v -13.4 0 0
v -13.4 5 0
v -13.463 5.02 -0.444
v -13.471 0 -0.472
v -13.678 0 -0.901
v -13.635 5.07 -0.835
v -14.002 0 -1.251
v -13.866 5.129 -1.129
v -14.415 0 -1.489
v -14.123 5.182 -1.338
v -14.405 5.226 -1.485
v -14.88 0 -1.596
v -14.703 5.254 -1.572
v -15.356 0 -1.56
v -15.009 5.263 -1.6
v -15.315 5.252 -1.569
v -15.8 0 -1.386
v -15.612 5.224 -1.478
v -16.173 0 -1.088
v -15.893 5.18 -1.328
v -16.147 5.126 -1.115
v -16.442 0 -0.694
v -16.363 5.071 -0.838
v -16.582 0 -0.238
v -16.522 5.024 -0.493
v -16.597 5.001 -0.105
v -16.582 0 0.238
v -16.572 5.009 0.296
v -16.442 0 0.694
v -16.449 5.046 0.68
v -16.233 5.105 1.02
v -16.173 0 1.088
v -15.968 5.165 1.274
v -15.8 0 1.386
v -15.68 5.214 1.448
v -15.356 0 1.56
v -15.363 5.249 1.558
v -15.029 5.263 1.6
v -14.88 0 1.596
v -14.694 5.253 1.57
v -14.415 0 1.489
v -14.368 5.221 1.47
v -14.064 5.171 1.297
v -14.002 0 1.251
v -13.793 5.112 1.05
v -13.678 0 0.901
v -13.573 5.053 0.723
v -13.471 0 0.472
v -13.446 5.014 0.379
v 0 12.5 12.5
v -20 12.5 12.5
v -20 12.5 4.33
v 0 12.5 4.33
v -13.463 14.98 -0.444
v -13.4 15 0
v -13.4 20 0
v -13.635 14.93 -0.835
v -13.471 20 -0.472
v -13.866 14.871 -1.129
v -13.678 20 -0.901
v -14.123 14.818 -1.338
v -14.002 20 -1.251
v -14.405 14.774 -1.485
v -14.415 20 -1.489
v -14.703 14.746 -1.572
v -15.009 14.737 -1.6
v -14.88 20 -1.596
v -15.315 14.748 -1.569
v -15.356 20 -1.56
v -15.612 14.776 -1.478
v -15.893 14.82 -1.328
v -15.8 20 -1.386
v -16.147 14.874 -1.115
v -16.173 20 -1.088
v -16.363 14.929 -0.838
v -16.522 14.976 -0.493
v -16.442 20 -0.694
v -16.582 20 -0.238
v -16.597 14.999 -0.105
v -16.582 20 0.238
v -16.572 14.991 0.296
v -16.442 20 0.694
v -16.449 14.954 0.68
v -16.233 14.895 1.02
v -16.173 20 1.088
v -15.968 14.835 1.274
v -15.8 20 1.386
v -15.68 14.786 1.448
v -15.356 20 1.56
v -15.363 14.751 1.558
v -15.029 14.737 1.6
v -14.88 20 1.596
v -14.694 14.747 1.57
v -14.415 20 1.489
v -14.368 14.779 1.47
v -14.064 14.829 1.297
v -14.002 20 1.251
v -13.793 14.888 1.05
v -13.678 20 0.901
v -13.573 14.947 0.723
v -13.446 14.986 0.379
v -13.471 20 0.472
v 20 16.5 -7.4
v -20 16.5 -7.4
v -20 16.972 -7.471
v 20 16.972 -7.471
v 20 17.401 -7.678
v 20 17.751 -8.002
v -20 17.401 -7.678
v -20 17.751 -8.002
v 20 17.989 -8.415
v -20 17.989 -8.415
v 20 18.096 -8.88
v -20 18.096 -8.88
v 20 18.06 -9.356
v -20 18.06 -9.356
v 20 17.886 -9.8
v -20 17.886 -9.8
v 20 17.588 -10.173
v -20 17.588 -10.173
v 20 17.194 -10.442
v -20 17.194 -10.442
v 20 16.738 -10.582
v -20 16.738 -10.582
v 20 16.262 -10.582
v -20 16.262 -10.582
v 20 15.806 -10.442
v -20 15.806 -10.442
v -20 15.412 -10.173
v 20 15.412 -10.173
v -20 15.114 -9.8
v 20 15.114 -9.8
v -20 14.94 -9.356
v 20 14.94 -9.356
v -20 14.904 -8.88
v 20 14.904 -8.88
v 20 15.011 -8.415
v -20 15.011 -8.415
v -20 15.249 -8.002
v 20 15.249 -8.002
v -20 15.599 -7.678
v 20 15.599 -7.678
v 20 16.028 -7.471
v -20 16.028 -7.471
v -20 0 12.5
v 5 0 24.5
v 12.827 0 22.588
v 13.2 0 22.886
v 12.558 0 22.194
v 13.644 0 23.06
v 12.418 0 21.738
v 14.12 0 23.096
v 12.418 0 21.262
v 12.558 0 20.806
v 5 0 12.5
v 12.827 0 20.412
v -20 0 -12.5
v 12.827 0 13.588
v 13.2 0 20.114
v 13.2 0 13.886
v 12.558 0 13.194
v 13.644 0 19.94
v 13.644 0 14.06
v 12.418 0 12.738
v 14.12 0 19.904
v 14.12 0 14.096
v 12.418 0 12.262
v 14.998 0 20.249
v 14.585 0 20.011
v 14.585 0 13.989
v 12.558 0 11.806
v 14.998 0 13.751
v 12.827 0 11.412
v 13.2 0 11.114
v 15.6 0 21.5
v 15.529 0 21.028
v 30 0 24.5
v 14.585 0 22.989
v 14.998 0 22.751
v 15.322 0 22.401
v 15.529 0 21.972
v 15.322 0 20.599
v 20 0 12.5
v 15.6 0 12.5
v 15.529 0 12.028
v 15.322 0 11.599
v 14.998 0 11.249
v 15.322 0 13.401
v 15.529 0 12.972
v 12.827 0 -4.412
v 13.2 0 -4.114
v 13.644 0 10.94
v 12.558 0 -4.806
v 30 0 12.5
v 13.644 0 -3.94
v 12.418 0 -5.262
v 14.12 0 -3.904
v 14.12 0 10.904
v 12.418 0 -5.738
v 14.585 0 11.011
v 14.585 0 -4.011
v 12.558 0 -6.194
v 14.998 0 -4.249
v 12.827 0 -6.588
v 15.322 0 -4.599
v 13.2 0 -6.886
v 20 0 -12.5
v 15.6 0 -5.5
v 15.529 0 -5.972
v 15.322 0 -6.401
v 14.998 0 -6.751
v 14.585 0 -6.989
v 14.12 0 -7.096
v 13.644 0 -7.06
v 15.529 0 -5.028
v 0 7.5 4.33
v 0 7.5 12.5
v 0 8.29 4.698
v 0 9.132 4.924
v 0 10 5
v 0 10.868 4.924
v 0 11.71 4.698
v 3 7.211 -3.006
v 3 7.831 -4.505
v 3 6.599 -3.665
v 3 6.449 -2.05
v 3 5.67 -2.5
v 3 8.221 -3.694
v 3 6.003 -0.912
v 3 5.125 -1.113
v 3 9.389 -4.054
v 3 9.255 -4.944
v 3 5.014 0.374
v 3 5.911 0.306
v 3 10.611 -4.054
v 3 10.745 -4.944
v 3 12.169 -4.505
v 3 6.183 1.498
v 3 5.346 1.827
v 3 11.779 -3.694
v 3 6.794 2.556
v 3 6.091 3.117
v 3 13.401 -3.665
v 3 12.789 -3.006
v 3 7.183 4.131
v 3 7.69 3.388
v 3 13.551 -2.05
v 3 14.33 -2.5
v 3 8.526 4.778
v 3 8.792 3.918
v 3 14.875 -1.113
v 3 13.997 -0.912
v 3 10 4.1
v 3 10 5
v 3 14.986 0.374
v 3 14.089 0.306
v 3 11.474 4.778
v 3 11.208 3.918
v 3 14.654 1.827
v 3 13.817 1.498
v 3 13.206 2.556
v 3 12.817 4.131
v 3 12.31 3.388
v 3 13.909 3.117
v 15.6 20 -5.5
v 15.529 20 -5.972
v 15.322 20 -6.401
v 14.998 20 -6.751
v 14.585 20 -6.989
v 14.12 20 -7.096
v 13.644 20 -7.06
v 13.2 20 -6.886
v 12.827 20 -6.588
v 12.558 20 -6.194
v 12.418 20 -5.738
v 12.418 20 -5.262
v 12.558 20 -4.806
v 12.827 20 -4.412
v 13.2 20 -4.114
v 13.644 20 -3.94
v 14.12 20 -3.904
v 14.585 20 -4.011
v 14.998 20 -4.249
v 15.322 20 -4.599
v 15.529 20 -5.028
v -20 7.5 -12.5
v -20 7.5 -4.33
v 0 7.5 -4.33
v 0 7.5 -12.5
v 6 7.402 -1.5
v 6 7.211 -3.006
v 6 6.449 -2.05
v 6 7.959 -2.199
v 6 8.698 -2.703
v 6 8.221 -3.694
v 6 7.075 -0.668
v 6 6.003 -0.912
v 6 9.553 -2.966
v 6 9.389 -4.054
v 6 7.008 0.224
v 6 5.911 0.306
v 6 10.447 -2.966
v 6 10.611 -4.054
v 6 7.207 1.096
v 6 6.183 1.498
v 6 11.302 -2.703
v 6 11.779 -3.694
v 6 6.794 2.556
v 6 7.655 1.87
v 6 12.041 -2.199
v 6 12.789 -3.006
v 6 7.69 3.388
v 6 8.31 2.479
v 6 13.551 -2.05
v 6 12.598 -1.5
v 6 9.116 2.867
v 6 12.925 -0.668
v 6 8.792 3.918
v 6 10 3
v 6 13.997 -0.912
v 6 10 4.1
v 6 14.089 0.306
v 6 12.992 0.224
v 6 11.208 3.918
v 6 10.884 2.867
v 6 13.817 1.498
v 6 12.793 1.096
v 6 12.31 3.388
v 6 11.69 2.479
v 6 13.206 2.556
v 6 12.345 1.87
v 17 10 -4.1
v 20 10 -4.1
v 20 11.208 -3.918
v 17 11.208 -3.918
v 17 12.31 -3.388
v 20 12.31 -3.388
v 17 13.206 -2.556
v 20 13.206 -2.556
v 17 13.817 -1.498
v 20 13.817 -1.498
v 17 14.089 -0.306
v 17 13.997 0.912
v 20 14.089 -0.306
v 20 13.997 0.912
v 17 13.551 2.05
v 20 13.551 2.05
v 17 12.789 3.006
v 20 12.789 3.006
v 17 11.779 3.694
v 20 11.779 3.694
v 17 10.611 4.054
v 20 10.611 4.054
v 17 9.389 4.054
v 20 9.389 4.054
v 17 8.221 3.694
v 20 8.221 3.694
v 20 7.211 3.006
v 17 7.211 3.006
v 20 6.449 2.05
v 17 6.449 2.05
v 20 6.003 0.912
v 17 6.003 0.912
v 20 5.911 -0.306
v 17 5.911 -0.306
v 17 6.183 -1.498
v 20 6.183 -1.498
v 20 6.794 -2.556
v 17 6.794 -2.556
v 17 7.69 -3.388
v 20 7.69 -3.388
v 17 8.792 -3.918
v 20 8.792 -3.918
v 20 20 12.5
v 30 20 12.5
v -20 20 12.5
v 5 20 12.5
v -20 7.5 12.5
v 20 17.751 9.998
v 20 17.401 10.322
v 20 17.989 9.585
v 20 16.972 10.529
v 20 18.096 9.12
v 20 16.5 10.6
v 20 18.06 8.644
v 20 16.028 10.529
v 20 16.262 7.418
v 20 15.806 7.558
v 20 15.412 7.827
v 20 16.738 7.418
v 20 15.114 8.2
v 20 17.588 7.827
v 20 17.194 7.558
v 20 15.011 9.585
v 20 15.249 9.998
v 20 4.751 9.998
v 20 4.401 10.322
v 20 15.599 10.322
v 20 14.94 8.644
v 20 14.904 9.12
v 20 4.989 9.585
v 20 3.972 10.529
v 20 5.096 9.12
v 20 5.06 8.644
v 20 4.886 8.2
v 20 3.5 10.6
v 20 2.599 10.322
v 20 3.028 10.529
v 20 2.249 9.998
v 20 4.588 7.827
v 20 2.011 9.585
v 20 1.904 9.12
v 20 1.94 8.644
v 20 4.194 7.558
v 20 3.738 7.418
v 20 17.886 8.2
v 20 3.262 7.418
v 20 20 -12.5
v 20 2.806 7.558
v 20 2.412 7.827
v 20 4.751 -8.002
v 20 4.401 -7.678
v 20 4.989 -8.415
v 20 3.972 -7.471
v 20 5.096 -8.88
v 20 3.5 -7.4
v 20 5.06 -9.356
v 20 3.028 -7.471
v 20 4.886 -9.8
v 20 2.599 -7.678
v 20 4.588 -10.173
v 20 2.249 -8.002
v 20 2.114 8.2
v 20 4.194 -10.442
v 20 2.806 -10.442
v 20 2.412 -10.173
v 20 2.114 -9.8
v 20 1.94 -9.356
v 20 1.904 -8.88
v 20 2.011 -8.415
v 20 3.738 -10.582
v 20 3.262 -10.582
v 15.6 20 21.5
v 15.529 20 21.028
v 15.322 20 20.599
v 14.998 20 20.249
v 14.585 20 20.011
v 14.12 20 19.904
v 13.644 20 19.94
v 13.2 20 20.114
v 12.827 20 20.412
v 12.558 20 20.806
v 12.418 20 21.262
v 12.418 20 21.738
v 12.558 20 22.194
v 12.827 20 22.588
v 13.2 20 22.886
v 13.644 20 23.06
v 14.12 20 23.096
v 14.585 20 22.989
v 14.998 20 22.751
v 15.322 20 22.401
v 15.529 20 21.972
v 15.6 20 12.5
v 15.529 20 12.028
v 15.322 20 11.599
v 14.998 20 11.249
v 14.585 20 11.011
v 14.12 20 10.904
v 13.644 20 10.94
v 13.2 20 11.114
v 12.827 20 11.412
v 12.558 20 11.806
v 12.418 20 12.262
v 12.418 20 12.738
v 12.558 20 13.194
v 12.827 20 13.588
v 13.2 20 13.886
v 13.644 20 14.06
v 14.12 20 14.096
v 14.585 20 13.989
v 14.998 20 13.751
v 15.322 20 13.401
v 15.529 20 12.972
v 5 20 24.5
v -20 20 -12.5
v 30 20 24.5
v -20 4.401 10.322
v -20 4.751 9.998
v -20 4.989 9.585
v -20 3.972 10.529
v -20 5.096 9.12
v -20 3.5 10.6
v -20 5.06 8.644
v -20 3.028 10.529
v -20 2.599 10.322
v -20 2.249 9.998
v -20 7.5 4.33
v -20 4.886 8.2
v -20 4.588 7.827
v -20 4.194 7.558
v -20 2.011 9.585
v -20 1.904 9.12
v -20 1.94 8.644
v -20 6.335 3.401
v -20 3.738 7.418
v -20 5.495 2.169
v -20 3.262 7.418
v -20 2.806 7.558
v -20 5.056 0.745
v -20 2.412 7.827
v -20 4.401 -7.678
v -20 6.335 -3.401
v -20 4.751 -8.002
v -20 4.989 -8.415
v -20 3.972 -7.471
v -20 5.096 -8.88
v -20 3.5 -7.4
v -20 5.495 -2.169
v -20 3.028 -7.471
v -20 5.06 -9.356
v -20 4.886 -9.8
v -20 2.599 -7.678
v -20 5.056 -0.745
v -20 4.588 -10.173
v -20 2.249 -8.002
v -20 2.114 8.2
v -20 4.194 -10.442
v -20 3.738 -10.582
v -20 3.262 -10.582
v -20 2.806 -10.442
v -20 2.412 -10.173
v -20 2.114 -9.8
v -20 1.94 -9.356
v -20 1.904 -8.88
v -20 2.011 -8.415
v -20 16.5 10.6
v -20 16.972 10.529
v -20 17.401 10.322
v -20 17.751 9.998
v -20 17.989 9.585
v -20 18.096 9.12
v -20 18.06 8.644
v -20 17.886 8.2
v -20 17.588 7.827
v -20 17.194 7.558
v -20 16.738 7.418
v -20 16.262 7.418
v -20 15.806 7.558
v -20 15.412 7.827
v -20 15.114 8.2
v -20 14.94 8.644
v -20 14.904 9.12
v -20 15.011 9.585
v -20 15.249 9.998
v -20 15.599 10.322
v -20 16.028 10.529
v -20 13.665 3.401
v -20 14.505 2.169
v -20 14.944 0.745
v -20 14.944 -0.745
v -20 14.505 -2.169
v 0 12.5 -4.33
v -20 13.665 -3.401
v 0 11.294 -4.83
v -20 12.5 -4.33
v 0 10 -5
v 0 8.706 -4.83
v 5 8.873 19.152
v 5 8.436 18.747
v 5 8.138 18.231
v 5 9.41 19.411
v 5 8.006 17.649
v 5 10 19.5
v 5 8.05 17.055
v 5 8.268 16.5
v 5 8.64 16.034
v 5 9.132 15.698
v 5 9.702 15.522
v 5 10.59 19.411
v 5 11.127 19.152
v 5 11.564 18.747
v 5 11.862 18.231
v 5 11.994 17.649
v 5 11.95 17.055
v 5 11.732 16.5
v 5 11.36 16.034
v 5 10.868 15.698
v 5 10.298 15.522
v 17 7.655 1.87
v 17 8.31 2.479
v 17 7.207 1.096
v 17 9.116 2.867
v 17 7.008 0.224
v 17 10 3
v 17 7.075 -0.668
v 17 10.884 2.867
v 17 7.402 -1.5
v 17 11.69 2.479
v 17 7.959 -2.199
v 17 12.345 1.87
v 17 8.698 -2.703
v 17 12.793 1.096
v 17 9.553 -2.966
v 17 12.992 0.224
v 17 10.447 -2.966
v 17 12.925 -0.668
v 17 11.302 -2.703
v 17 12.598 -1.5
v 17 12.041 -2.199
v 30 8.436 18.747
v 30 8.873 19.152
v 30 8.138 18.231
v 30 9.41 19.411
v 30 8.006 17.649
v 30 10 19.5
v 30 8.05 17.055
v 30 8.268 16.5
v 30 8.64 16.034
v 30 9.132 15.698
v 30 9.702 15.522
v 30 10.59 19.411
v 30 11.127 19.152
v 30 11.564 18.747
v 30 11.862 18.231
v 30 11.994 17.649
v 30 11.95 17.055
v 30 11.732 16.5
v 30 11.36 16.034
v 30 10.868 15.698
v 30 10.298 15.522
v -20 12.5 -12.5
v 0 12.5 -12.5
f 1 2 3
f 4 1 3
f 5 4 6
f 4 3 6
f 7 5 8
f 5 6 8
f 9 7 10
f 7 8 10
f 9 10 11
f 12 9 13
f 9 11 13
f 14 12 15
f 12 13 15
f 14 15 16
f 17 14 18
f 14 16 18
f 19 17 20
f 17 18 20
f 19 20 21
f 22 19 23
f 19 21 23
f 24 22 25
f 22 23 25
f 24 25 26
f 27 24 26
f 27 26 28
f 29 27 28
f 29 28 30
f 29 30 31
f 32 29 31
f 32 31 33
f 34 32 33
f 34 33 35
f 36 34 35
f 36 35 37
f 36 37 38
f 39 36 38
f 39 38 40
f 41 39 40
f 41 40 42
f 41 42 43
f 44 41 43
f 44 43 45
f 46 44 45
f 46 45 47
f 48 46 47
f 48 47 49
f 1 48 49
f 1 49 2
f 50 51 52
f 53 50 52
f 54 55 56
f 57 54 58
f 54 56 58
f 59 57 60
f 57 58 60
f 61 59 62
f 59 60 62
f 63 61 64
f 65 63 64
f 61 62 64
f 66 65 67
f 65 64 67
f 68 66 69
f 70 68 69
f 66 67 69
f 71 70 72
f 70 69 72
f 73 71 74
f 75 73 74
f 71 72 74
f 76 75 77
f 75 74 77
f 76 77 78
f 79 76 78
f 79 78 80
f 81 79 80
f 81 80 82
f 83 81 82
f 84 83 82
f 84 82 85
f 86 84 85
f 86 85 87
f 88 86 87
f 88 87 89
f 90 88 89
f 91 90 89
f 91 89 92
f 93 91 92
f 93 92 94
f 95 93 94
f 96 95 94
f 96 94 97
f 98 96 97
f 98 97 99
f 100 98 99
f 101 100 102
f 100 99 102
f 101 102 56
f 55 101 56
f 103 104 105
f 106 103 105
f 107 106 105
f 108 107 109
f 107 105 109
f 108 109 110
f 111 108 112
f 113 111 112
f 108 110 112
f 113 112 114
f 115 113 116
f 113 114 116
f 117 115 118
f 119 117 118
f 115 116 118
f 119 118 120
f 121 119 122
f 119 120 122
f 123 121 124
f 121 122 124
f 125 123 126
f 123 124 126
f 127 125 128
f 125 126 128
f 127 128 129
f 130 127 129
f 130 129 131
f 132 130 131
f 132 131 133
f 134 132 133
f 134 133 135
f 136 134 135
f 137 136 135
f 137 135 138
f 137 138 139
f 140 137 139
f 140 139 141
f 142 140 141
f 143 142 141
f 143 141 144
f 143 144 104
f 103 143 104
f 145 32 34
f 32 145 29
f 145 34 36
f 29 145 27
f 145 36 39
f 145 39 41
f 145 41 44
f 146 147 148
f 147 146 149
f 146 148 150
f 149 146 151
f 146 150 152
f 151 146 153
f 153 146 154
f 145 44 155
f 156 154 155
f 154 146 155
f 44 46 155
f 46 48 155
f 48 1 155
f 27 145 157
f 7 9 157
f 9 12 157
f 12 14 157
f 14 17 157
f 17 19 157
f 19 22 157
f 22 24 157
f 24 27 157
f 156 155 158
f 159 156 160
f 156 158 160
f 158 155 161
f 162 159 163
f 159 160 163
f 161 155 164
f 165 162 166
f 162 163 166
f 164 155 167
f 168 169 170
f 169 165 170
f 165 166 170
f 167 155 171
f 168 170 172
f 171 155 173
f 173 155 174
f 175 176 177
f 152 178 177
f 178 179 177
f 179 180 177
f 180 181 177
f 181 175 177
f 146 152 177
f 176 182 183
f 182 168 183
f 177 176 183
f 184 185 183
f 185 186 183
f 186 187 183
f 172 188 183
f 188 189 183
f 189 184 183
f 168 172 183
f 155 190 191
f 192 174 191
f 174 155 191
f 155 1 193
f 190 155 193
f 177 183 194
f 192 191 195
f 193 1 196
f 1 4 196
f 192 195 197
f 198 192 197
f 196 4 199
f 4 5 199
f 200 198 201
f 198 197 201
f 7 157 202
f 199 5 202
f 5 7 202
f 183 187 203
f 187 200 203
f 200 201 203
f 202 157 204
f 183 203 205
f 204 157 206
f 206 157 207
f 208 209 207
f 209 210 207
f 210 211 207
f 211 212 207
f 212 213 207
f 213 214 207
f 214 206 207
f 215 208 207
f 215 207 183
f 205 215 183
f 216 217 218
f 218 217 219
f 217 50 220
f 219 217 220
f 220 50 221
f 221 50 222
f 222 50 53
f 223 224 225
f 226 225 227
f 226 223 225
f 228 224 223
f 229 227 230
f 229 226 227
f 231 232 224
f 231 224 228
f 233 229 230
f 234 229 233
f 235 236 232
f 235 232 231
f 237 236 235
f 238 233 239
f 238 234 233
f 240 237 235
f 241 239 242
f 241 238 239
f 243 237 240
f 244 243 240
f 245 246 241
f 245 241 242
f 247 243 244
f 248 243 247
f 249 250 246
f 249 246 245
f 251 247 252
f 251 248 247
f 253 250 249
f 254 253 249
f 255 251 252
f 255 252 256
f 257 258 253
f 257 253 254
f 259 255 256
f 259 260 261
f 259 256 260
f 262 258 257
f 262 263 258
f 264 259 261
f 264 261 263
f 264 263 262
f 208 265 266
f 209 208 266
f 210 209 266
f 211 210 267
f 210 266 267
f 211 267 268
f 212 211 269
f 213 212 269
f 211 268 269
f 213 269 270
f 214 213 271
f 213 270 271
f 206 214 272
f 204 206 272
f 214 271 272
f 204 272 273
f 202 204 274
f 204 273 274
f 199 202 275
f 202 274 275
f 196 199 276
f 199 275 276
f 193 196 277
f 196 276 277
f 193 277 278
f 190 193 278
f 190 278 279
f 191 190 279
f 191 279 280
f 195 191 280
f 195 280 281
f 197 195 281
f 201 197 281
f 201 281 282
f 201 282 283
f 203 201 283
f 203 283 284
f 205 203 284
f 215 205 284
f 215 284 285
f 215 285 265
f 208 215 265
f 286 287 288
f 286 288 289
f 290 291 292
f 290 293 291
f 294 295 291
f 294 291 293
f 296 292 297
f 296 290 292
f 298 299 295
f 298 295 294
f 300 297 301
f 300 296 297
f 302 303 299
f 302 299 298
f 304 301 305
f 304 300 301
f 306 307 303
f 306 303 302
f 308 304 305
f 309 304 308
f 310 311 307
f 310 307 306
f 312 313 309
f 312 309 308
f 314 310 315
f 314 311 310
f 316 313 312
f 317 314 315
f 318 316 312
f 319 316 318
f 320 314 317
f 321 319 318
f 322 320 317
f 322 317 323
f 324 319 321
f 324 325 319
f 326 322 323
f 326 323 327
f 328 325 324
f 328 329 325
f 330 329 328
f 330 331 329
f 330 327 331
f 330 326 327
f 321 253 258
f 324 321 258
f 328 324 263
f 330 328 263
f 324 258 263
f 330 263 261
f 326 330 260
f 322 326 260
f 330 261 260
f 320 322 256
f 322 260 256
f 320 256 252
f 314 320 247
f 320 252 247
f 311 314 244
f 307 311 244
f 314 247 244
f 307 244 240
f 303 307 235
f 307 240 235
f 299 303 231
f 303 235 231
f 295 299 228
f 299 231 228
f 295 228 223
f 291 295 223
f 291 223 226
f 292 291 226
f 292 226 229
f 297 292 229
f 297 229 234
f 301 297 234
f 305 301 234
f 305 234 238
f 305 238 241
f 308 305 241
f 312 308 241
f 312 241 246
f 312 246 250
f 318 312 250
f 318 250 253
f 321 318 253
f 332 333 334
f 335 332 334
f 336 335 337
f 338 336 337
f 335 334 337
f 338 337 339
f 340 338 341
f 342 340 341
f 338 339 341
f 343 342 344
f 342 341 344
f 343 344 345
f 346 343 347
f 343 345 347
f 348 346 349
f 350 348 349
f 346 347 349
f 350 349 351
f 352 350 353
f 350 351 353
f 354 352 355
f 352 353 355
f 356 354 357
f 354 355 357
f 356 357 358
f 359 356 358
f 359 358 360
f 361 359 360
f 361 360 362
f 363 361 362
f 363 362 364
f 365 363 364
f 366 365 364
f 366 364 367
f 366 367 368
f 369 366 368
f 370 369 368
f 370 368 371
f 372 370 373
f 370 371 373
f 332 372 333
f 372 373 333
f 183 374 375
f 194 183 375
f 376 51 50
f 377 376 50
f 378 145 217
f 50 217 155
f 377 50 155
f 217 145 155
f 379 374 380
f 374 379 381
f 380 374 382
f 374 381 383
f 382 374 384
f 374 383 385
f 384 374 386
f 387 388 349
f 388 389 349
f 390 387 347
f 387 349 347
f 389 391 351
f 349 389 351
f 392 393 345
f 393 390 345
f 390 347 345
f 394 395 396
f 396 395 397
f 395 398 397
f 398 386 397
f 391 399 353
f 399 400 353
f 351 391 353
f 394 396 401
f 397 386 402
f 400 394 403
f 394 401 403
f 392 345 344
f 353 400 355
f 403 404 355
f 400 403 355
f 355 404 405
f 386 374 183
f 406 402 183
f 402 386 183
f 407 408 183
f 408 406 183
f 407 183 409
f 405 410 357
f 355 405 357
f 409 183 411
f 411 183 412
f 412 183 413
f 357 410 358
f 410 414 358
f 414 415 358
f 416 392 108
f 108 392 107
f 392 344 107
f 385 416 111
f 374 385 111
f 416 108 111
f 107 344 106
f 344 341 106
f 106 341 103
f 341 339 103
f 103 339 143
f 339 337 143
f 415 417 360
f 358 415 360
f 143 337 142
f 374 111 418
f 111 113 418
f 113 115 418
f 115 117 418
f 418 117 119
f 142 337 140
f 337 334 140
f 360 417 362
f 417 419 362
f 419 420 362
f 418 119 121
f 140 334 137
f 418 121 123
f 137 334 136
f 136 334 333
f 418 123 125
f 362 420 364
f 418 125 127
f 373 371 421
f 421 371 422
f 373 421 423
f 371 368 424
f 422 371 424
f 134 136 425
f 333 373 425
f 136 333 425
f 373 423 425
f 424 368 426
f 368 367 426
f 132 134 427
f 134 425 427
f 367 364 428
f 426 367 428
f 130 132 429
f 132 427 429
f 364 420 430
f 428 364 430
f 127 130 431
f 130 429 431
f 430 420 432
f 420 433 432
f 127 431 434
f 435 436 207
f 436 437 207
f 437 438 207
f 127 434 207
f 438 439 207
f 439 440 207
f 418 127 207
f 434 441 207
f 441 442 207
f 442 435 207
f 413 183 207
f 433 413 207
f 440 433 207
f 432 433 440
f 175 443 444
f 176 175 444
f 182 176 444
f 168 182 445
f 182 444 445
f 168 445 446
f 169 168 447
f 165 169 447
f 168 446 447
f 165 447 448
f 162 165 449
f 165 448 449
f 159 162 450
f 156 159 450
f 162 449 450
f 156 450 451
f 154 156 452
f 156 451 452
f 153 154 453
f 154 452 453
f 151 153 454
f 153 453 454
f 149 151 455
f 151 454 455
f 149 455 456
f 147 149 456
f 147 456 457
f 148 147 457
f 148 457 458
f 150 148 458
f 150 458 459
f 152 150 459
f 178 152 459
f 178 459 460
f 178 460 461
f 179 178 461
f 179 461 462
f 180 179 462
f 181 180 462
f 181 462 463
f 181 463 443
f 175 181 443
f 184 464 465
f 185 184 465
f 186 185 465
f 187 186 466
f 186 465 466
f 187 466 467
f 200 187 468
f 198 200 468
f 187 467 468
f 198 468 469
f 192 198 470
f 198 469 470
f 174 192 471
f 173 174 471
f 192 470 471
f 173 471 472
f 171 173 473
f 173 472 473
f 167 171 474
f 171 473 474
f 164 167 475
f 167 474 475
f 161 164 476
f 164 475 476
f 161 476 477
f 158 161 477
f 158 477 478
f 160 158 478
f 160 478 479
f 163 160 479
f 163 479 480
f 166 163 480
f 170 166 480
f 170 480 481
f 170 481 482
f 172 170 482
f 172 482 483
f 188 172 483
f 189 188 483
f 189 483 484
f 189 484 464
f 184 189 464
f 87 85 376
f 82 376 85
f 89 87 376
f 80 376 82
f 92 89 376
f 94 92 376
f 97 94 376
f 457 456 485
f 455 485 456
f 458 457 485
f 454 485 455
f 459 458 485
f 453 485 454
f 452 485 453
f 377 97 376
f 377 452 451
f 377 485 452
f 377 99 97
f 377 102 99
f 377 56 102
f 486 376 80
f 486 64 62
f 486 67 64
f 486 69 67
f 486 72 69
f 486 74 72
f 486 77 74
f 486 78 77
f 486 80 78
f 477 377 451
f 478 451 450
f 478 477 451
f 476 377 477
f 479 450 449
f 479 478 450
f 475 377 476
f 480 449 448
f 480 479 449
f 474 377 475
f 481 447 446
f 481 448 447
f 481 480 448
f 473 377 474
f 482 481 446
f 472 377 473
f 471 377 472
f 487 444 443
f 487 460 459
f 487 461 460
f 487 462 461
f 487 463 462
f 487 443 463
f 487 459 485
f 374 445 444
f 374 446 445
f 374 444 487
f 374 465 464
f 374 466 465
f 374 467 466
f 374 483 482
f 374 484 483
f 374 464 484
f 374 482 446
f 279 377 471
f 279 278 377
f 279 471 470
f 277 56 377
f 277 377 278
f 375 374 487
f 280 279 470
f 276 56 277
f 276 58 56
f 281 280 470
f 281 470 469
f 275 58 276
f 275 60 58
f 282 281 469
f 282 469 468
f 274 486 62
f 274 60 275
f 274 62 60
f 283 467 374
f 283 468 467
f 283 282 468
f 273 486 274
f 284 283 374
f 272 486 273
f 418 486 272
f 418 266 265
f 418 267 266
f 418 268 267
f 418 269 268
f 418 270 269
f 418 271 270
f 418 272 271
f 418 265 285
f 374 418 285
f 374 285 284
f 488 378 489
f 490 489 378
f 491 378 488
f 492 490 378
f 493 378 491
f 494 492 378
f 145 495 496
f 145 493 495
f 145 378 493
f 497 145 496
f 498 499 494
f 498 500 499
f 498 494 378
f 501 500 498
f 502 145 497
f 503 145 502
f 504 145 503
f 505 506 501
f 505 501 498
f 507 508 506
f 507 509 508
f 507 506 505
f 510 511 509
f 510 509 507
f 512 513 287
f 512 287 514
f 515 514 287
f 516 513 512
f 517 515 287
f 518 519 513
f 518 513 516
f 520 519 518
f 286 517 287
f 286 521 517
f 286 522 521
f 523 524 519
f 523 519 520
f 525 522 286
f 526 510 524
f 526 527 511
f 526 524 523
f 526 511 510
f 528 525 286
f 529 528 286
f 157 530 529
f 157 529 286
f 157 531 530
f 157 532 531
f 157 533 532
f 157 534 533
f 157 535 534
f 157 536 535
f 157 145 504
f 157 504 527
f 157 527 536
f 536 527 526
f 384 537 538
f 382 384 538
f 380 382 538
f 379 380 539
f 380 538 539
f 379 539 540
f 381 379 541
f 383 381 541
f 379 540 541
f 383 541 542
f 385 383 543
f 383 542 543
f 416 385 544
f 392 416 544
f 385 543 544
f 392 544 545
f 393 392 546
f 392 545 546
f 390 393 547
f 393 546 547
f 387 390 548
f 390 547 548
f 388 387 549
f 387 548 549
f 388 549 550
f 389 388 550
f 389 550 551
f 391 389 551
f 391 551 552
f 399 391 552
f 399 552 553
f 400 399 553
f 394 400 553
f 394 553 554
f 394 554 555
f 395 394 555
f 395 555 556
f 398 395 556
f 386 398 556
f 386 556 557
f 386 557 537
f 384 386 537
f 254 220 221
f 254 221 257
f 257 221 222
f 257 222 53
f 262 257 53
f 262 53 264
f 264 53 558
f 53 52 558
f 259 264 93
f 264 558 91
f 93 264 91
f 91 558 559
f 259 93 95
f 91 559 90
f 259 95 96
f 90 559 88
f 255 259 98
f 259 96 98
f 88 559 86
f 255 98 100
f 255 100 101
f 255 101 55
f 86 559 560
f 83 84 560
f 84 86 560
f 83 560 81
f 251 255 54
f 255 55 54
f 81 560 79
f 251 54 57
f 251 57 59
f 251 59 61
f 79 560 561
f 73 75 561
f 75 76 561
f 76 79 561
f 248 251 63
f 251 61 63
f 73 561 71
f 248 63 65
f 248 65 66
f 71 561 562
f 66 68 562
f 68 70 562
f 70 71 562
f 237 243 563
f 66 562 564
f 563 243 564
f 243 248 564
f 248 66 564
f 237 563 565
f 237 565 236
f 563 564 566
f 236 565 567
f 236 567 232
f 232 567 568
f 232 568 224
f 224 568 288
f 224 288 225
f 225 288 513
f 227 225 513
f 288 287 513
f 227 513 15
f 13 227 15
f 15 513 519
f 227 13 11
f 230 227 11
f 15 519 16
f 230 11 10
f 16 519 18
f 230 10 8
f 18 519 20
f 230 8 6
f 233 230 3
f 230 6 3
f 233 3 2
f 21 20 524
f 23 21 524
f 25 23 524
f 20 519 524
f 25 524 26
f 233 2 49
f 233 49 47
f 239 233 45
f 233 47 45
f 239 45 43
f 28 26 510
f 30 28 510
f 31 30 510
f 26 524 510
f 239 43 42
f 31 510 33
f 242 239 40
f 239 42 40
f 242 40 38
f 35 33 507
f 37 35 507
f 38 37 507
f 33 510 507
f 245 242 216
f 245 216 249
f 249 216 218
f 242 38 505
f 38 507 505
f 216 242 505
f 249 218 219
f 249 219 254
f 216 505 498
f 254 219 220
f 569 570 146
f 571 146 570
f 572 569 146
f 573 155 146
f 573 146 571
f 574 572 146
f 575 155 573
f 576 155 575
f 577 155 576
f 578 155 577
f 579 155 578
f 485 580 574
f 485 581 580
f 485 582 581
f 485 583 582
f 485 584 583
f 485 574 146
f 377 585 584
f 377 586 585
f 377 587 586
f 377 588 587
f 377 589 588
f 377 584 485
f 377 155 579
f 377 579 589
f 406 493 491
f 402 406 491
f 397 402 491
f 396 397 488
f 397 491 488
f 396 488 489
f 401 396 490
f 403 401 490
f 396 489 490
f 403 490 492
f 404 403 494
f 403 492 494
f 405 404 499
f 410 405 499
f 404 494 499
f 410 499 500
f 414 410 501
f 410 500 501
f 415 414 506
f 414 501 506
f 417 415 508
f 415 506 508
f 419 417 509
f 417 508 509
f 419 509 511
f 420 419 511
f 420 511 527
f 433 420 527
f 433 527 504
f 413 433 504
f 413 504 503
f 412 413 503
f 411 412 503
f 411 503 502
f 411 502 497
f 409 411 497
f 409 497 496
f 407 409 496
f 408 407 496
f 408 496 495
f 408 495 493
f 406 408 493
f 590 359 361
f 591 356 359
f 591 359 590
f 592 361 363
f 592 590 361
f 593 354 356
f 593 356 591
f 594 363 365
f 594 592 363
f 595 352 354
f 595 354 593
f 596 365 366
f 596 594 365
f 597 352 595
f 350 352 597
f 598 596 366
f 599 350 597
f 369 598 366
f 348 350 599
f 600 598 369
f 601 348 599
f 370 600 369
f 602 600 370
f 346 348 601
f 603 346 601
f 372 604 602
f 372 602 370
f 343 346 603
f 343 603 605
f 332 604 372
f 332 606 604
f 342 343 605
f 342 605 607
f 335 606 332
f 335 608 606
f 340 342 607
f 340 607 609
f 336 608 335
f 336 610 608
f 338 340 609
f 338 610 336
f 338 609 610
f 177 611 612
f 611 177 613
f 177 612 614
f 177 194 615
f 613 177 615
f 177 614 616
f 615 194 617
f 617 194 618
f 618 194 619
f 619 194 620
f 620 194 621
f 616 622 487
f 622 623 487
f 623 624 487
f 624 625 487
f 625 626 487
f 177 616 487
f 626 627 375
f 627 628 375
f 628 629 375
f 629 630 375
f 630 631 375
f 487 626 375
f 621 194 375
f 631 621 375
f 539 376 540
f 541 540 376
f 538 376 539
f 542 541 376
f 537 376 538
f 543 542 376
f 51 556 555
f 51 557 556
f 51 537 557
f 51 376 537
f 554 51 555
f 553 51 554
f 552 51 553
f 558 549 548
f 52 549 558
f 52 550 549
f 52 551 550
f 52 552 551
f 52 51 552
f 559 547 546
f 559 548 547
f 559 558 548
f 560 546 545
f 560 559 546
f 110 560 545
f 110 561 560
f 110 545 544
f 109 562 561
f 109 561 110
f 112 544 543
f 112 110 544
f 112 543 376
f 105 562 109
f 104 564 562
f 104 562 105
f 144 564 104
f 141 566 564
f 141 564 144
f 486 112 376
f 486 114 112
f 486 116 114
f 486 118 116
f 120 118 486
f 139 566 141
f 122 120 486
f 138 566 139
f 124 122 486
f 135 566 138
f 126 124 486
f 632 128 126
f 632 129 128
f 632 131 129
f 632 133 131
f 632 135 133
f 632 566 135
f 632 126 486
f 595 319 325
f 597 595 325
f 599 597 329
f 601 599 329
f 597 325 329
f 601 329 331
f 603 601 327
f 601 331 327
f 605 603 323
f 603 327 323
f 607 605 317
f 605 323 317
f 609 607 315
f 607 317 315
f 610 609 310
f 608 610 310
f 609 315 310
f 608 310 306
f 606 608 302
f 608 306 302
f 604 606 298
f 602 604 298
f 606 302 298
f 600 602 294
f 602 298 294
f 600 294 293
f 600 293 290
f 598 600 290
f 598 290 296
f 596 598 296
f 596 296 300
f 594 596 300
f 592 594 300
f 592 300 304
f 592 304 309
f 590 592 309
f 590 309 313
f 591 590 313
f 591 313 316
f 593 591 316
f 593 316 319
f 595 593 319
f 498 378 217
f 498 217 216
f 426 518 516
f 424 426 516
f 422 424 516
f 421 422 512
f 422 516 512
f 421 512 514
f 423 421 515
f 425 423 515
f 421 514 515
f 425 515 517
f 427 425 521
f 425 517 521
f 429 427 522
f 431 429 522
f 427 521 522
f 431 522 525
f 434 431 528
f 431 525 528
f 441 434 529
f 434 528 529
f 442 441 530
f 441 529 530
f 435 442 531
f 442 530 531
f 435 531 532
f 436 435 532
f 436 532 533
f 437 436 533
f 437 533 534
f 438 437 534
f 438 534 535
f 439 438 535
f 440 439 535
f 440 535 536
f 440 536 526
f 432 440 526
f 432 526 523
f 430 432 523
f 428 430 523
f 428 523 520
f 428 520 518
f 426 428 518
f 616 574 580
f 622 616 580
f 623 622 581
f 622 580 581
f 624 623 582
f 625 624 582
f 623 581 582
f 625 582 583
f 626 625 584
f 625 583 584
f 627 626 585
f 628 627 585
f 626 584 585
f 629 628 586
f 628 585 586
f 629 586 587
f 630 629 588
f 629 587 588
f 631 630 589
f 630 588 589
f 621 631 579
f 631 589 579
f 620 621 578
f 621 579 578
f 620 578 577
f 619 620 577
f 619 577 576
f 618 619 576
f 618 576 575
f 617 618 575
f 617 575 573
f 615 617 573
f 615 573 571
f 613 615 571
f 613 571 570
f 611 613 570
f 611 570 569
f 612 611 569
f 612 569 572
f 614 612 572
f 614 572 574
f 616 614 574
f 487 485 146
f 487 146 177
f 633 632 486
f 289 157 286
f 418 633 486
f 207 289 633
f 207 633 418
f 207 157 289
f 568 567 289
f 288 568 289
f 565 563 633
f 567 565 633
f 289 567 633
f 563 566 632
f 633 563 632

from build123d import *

# Parameters (mm, degrees)
SKETCH_1_W          = 40
SKETCH_1_H          = 25
EXTRUDE_1_DEPTH     = 20
SKETCH_3_R          = 3
CUT_EXTRUDE_2_DEPTH = 41
SKETCH_2_R          = 4.1
CUT_EXTRUDE_1_DEPTH = 26
SKETCH_4_W          = 25
SKETCH_4_H          = 5
CUT_EXTRUDE_3_DEPTH = 20
SKETCH_5_R          = 4.1
CUT_EXTRUDE_4_DEPTH = 3
SKETCH_6_R          = 1.6
CUT_EXTRUDE_5_DEPTH = 21
SKETCH_7_R          = 1.6
CUT_EXTRUDE_6_DEPTH = 41
SKETCH_8_W          = 25
SKETCH_8_H          = 20
EXTRUDE_2_DEPTH     = 12
SKETCH_9_R          = 1.6
CUT_EXTRUDE_7_DEPTH = 21.0000001
SKETCH_10_R         = 2
CUT_EXTRUDE_8_DEPTH = 26
SKETCH_12_R         = 5
CUT_EXTRUDE_9_DEPTH = 23


with BuildPart() as part:
    # Эскиз1 → Бобышка-Вытянуть1 (new body)
    with BuildSketch(Plane(origin=(0, 0, 0), x_dir=(1, 0, 0), z_dir=(0, 1, 0))):
        Rectangle(SKETCH_1_W, SKETCH_1_H)
    extrude(amount=EXTRUDE_1_DEPTH)

    # Эскиз3 → Вырез-Вытянуть2 (cut, through all)
    with BuildSketch(Plane.ZY.offset(20)):
        with Locations((0, 10)):
            Circle(SKETCH_3_R)
    extrude(amount=-CUT_EXTRUDE_2_DEPTH, mode=Mode.SUBTRACT)

    # Эскиз2 → Вырез-Вытянуть1 (cut)
    with BuildSketch(Plane.ZY.offset(20)):
        with Locations((0, 10)):
            Circle(SKETCH_2_R)
    extrude(amount=-CUT_EXTRUDE_1_DEPTH, mode=Mode.SUBTRACT)

    # Эскиз4 → Вырез-Вытянуть3 (cut)
    with BuildSketch(Plane(origin=(-20, 0, 0), x_dir=(0, 0, -1), z_dir=(1, 0, 0))):
        with Locations((0, 10)):
            Rectangle(SKETCH_4_W, SKETCH_4_H)
    extrude(amount=CUT_EXTRUDE_3_DEPTH, mode=Mode.SUBTRACT)

    # Эскиз5 → Вырез-Вытянуть4 (cut)
    with BuildSketch(Plane(origin=(20, 0, 0), x_dir=(0, 0, -1), z_dir=(1, 0, 0))):
        with Locations((0, 10)):
            Circle(SKETCH_5_R)
    extrude(amount=-CUT_EXTRUDE_4_DEPTH, mode=Mode.SUBTRACT)

    # Эскиз6 → Вырез-Вытянуть5 (cut, through all)
    with BuildSketch(Plane(origin=(0, 20, 0), x_dir=(1, 0, 0), z_dir=(0, 1, 0))):
        with Locations((-15, 0)):
            Circle(SKETCH_6_R)
    extrude(amount=-CUT_EXTRUDE_5_DEPTH, mode=Mode.SUBTRACT)

    # Эскиз7 → Вырез-Вытянуть6 (cut, through all)
    with BuildSketch(Plane.ZY.offset(20)):
        with Locations((-9, 16.5)):
            Circle(SKETCH_7_R)
        with Locations((9, 16.5)):
            Circle(SKETCH_7_R)
        with Locations((-9, 3.5)):
            Circle(SKETCH_7_R)
        with Locations((9, 3.5)):
            Circle(SKETCH_7_R)
    extrude(amount=-CUT_EXTRUDE_6_DEPTH, mode=Mode.SUBTRACT)

    # Эскиз8 → Бобышка-Вытянуть2 (add)
    with BuildSketch(Plane.XY.offset(12.5)):
        with Locations((17.5, 10)):
            Rectangle(SKETCH_8_W, SKETCH_8_H)
    extrude(amount=EXTRUDE_2_DEPTH)

    # Эскиз9 → Вырез-Вытянуть7 (cut, through all)
    with BuildSketch(Plane(origin=(0, 20, 0), x_dir=(1, 0, 0), z_dir=(0, 1, 0))):
        with Locations((14, -21.5)):
            Circle(SKETCH_9_R)
        with Locations((14, 5.5)):
            Circle(SKETCH_9_R)
        with Locations((14, -12.5)):
            Circle(SKETCH_9_R)
    extrude(amount=-CUT_EXTRUDE_7_DEPTH, mode=Mode.SUBTRACT)

    # Эскиз10 → Вырез-Вытянуть8 (cut, through all)
    with BuildSketch(Plane.ZY.offset(-5)):
        with Locations((17.5, 10)):
            Circle(SKETCH_10_R)
    extrude(amount=-CUT_EXTRUDE_8_DEPTH, mode=Mode.SUBTRACT)

    # Эскиз12 → Вырез-Вытянуть9 (cut)
    with BuildSketch(Plane.ZY.offset(20)):
        with Locations((0, 10)):
            Circle(SKETCH_12_R)
    extrude(amount=-CUT_EXTRUDE_9_DEPTH, mode=Mode.SUBTRACT)


solid = part.part
